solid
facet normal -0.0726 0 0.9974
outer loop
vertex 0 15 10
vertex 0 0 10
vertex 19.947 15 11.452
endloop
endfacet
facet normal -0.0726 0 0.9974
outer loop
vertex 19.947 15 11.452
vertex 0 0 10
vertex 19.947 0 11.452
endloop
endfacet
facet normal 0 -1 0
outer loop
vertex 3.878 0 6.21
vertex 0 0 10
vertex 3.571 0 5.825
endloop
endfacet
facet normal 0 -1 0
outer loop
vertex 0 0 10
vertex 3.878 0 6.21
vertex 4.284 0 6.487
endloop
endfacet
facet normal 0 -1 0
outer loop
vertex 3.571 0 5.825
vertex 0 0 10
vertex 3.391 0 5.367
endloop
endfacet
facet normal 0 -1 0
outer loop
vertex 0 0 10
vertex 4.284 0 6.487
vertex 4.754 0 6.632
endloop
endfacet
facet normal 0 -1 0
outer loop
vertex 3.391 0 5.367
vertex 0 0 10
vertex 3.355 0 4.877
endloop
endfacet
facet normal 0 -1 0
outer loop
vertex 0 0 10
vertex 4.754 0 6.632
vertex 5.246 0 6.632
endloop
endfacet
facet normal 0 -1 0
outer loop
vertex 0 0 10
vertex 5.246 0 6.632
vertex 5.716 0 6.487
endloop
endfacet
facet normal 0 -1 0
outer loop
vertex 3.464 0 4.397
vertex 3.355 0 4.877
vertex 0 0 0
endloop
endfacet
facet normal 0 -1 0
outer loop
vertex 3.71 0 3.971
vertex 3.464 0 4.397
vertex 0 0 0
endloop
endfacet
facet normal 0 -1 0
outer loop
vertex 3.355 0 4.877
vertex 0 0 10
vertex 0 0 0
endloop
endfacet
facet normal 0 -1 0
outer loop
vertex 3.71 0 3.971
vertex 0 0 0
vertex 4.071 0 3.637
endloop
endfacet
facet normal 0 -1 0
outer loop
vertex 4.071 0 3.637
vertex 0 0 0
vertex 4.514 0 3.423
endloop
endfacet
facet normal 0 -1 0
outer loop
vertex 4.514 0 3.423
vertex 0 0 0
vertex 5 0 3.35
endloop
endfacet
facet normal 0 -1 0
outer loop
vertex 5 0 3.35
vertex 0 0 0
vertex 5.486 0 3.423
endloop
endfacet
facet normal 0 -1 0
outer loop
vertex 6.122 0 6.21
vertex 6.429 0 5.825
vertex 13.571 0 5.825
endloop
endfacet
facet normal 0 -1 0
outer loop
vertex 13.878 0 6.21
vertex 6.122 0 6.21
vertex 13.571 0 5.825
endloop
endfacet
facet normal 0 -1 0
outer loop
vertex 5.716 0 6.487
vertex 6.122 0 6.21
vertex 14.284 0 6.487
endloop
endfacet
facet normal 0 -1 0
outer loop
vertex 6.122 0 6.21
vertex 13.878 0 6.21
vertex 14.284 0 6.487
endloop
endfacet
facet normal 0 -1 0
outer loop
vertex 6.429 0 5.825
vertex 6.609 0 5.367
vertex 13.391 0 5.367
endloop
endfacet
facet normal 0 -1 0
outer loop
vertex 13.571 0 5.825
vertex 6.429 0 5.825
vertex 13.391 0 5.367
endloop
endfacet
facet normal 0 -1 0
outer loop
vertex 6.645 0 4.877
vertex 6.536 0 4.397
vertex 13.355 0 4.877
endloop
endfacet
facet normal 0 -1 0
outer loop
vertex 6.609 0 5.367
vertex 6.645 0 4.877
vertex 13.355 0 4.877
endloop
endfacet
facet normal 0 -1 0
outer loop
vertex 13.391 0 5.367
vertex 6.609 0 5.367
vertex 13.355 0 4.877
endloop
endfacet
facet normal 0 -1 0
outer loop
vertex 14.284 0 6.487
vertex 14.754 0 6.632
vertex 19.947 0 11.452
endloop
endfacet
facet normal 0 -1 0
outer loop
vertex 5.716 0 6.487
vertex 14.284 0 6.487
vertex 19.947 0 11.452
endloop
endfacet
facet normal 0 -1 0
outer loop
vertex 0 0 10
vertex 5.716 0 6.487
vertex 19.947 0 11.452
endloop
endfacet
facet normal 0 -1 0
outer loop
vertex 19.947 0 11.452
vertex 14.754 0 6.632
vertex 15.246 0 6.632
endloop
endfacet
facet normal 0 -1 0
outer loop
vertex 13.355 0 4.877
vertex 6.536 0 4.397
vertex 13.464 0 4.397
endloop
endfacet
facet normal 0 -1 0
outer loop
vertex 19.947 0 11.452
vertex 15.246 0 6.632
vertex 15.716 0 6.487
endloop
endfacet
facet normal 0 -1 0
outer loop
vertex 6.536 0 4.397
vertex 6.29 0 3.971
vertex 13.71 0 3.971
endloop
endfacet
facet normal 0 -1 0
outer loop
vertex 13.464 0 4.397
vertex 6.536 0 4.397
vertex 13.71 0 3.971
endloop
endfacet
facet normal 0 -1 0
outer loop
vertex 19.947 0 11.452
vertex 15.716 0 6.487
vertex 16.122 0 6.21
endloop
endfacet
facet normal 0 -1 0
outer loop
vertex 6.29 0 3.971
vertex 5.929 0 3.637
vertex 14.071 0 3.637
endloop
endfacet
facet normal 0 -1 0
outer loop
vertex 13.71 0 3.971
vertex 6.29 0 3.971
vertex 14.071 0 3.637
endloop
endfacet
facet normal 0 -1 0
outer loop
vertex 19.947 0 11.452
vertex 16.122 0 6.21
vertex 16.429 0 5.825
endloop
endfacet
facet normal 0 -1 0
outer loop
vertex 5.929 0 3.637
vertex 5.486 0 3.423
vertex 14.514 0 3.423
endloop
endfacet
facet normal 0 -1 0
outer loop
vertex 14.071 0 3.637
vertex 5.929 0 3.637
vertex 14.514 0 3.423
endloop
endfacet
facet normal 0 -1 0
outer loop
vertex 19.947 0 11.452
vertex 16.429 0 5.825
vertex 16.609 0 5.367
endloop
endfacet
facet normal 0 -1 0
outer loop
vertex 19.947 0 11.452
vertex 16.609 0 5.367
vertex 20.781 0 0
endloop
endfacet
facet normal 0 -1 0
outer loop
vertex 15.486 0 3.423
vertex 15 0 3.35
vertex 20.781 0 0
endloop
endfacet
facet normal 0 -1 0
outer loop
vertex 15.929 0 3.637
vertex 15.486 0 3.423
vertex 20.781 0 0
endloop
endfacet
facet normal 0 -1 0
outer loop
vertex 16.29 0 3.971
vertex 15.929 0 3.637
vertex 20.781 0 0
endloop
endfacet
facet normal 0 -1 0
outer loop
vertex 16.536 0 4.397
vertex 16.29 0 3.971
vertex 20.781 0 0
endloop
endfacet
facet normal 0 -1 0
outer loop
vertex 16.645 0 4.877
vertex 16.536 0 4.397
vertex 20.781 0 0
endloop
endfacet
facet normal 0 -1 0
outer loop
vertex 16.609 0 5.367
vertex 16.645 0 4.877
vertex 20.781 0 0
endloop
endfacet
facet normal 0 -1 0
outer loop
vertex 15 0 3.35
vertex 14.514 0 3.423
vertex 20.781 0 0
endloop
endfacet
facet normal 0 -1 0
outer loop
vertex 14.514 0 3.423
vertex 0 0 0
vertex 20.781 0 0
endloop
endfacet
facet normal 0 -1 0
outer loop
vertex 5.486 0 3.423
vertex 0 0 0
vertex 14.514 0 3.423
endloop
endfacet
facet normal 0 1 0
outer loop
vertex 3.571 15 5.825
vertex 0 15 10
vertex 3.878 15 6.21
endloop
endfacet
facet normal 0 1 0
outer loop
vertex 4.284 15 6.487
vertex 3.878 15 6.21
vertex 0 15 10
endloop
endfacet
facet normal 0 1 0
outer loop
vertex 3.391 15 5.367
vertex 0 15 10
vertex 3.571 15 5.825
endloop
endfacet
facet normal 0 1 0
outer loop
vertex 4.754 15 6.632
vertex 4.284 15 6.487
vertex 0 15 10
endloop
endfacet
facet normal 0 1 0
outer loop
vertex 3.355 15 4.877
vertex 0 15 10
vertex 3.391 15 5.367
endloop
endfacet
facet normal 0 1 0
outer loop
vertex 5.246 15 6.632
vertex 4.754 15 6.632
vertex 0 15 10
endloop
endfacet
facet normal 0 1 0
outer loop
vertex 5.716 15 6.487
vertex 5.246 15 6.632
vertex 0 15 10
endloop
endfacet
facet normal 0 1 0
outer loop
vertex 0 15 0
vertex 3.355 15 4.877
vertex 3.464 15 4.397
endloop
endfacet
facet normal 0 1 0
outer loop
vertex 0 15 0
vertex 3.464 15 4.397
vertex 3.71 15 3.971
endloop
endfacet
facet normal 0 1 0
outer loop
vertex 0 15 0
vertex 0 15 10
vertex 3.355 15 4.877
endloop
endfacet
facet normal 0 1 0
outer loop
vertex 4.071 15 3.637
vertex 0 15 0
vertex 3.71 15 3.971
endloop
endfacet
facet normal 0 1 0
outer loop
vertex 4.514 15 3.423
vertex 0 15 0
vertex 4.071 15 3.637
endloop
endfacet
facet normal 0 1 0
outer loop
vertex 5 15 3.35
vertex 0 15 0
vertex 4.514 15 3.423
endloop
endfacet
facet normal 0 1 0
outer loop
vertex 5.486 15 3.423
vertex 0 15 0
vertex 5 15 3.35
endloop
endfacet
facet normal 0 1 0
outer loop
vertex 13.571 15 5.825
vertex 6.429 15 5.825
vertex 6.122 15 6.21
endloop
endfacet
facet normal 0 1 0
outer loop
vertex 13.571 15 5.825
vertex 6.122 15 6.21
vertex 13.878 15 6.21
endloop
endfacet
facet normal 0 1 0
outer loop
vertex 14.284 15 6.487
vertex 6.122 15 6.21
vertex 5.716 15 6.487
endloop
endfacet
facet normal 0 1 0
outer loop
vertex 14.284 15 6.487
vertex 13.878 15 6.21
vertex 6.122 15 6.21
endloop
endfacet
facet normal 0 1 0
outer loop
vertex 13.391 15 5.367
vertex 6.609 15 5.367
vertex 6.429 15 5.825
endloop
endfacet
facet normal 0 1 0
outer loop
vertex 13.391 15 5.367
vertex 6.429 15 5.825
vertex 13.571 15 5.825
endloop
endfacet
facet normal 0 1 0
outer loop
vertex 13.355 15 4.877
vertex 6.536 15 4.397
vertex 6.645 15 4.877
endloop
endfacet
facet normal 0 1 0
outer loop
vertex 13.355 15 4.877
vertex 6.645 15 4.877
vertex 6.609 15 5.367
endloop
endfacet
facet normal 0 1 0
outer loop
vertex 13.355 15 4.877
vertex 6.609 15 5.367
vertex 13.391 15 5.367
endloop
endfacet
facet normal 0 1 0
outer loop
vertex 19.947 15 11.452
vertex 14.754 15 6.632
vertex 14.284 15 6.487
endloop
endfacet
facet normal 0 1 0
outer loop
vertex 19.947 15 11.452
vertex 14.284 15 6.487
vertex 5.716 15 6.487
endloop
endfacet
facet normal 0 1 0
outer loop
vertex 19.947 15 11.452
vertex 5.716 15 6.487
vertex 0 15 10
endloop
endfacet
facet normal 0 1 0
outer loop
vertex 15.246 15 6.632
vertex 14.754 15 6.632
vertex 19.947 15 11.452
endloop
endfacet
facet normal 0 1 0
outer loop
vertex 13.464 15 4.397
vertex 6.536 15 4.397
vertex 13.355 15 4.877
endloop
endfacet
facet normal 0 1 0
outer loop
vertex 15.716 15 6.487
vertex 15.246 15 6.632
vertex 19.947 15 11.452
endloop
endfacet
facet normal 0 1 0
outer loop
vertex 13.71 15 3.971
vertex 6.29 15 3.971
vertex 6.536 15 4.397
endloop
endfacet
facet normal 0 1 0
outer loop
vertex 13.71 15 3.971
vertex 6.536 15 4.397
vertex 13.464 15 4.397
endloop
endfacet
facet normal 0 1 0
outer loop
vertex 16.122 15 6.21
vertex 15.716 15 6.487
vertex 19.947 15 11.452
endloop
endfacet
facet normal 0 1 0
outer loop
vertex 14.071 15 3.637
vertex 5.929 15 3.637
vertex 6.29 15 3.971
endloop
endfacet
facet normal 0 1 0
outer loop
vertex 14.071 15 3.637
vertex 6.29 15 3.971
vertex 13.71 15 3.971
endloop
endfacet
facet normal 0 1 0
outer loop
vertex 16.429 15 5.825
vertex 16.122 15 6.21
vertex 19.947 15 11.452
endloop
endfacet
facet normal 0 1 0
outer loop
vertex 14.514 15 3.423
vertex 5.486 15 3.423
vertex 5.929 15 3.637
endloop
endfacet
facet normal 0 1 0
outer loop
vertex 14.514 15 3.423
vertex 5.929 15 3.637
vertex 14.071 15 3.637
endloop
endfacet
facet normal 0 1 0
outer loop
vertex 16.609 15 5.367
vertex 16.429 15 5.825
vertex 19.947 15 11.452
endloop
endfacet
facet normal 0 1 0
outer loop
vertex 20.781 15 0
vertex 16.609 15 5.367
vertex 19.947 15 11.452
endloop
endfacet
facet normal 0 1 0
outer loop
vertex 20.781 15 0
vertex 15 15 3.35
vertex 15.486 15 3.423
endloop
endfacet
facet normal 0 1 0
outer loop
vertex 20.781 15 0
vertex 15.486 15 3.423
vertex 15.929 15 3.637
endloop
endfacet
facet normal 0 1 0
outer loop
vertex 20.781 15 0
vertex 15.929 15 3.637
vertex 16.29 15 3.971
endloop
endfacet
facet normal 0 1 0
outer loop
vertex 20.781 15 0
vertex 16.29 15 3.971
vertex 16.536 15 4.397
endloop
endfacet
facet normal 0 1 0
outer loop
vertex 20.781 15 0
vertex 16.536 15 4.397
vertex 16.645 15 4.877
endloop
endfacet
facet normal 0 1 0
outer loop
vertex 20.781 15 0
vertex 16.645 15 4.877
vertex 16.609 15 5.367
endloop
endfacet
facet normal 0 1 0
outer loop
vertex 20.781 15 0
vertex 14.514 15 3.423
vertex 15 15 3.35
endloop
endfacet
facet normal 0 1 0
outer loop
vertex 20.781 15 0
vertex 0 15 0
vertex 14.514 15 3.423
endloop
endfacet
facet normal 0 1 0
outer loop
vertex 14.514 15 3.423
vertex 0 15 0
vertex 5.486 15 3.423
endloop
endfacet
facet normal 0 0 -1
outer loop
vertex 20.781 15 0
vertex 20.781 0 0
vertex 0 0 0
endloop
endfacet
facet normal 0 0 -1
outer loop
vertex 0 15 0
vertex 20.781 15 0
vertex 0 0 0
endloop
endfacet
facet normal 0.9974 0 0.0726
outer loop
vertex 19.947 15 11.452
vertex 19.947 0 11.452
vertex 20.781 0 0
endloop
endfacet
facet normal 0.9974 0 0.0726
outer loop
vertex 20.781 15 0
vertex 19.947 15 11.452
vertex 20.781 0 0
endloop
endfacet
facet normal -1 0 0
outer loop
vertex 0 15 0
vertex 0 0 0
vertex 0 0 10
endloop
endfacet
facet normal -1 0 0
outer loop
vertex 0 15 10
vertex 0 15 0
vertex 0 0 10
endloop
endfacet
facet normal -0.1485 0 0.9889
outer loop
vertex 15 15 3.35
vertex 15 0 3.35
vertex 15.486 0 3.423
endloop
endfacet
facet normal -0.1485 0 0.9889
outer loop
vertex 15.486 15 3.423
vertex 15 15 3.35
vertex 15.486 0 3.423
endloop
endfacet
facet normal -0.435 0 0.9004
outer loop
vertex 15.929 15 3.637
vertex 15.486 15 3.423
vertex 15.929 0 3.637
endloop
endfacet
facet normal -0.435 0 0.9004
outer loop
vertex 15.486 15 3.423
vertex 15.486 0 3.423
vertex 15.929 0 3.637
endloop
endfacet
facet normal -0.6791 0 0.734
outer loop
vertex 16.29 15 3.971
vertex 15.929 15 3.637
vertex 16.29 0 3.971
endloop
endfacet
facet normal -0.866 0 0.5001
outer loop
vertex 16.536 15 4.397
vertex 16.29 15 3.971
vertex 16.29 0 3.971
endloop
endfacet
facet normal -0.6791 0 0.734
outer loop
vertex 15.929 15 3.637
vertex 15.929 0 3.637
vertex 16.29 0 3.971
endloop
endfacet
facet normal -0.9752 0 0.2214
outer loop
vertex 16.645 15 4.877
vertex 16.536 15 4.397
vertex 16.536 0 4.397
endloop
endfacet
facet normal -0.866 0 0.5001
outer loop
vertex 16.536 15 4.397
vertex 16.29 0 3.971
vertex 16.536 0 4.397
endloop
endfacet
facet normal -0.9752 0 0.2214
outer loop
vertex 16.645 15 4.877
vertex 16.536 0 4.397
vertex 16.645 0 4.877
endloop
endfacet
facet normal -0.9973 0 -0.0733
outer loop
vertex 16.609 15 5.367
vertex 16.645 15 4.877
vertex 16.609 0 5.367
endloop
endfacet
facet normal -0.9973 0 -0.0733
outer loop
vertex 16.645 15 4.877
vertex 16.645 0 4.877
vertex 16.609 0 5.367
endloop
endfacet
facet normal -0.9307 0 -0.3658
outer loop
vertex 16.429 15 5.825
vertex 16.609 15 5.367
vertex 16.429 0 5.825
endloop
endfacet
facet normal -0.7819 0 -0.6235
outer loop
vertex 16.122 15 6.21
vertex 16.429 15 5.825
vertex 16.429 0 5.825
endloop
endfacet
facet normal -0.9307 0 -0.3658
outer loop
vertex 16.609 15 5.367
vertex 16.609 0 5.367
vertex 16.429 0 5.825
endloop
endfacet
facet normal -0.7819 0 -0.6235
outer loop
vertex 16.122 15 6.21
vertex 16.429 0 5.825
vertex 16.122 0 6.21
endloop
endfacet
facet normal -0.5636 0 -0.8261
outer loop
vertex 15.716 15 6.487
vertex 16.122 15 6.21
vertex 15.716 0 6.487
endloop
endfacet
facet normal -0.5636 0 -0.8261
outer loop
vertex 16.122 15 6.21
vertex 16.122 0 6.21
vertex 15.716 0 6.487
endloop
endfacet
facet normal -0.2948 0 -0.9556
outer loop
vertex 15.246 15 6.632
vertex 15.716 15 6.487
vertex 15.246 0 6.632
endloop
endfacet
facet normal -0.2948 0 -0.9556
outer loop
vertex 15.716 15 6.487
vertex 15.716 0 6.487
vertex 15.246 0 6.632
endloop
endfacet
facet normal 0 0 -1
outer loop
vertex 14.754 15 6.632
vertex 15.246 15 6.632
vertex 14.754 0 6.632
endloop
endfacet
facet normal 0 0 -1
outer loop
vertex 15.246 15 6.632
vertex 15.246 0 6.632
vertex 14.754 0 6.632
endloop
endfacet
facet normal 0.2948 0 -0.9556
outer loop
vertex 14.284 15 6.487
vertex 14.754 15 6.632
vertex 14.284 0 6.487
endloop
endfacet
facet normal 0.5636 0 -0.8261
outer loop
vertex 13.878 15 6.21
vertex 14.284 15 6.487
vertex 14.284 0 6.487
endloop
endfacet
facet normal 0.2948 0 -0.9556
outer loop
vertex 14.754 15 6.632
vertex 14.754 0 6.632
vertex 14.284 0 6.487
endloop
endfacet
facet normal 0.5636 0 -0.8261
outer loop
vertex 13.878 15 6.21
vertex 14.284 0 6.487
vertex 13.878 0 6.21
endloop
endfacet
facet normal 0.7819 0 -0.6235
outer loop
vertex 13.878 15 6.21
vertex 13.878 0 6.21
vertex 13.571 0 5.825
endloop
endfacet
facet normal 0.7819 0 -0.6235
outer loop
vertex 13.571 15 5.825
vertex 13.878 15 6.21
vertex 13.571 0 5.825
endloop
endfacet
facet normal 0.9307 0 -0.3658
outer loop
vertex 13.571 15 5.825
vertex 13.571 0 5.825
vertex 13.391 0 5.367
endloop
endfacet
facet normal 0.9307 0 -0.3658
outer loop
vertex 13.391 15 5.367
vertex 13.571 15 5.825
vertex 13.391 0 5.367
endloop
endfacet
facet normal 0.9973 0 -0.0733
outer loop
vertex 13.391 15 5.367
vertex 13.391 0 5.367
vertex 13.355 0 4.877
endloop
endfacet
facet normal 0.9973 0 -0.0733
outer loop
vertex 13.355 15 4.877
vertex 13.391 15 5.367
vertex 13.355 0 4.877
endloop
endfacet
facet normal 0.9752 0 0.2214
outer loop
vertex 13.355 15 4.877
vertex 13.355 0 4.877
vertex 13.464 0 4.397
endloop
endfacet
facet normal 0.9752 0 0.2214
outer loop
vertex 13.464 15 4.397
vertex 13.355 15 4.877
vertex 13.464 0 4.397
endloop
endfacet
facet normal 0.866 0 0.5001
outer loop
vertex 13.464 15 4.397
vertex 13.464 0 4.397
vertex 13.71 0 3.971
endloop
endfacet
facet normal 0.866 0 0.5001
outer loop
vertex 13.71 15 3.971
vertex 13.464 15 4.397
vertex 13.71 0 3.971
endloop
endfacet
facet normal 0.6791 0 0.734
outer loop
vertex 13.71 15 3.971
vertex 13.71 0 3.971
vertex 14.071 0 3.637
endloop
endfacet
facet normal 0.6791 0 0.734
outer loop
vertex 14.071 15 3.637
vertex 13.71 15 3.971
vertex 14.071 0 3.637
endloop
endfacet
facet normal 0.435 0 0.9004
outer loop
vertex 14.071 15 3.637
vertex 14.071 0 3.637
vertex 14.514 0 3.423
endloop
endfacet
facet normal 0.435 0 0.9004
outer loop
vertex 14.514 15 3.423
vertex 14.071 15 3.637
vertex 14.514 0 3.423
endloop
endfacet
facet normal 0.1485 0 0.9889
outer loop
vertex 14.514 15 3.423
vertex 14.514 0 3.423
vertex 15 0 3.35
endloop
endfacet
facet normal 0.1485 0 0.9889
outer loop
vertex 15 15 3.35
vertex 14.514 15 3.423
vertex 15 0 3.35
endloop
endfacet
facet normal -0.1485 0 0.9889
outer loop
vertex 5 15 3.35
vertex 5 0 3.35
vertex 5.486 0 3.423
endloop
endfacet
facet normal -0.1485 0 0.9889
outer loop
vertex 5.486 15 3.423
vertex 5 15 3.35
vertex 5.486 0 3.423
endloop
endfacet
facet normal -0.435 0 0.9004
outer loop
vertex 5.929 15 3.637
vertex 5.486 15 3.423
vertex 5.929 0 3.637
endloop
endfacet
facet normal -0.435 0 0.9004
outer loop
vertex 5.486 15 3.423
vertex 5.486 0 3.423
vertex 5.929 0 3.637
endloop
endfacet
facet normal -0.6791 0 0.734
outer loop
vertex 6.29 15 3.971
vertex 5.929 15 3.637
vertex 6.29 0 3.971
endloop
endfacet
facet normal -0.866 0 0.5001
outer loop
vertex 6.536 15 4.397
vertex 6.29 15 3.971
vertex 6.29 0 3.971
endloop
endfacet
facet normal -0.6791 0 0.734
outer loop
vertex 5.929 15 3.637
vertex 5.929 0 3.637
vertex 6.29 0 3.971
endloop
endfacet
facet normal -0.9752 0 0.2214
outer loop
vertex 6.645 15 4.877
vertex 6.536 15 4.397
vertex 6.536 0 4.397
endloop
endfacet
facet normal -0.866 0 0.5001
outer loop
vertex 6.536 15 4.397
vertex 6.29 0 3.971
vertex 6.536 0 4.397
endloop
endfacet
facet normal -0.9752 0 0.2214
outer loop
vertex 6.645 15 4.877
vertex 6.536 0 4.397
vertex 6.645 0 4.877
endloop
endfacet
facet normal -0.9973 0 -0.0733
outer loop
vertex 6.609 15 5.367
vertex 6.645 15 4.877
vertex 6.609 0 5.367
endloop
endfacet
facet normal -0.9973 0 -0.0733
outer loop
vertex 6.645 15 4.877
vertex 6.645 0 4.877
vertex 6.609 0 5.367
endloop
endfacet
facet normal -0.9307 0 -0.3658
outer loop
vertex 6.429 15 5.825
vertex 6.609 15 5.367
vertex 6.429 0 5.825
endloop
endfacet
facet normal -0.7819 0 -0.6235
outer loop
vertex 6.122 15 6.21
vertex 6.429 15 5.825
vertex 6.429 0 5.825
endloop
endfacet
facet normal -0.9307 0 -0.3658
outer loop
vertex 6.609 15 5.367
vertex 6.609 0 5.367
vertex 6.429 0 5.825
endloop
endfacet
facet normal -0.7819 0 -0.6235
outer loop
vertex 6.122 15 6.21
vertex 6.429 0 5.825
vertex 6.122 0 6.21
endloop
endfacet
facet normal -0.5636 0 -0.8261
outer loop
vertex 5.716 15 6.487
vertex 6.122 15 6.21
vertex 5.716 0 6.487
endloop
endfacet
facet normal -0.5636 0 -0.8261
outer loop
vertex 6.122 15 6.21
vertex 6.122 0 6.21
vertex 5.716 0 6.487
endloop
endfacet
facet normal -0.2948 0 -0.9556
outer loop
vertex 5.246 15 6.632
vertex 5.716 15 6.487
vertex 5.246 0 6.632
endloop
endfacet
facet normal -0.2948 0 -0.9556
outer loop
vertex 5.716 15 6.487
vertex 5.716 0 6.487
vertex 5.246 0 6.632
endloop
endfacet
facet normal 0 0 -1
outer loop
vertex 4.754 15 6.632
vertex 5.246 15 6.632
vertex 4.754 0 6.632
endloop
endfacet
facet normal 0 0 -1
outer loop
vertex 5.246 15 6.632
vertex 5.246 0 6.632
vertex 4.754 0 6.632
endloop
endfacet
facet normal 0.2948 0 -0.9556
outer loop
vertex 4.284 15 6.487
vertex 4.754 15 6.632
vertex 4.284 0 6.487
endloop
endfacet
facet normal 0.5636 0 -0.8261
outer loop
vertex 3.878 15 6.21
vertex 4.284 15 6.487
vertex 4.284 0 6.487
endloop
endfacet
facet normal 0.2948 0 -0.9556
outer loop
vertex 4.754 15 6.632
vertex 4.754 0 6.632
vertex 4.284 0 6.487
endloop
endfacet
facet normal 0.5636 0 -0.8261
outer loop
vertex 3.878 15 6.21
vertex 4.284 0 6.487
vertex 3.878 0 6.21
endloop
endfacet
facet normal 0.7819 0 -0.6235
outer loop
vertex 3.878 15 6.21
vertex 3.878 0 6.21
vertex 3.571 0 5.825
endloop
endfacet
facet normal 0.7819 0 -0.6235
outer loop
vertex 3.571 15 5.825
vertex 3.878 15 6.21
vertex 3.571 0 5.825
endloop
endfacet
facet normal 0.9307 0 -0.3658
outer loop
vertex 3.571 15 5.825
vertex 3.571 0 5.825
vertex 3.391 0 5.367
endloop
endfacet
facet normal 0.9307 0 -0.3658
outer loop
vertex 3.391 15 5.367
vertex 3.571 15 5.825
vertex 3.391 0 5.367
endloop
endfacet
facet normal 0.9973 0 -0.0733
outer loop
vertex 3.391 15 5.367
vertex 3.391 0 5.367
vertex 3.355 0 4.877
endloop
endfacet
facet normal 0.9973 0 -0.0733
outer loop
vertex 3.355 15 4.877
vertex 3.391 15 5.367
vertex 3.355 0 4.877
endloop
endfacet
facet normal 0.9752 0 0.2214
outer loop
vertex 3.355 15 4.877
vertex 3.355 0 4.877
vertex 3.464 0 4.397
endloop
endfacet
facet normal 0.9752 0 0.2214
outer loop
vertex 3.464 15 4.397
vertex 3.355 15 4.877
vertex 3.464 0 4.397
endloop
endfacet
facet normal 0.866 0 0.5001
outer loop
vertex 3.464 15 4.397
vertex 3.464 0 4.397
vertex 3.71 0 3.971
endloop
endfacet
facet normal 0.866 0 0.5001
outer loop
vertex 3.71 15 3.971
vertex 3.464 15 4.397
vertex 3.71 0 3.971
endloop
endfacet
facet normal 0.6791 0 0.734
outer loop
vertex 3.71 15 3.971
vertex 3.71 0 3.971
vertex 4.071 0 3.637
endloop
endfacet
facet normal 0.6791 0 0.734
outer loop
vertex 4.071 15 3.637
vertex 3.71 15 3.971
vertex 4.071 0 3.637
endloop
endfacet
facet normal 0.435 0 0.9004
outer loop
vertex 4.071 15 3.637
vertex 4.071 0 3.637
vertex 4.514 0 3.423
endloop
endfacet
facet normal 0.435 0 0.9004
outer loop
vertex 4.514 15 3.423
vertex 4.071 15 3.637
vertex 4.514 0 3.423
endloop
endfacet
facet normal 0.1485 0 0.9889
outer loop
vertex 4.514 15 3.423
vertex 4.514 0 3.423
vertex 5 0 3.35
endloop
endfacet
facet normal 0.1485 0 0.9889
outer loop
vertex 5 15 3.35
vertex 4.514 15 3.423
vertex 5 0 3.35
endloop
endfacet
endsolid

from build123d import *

# Parameters (mm, degrees)
EXTRUDE_1_DEPTH     = 15
SKETCH_2_R          = 1.45
CUT_EXTRUDE_1_DEPTH = 29.071464012
SKETCH_3_R          = 1.65
CUT_EXTRUDE_2_DEPTH = 29.071464012


with BuildPart() as part:
    # 草图1 → 凸台-拉伸1 (new body)
    with BuildSketch(Plane(origin=(0, 0, 0), x_dir=(1, 0, 0), z_dir=(0, 1, 0))):
        Polygon((0, 0), (0, -10), (19.947198592, -11.452332033), (20.781029397, 0), align=None)
    extrude(amount=EXTRUDE_1_DEPTH)

    # 草图2 → 切除-拉伸1 (cut, through all)
    with BuildSketch(Plane.XZ):
        with Locations(Location((5, 5, 0), (0, 0, 270))):
            Circle(SKETCH_2_R)
        with Locations(Location((15, 5, 0), (0, 0, 270))):
            Circle(SKETCH_2_R)
    extrude(amount=-CUT_EXTRUDE_1_DEPTH, mode=Mode.SUBTRACT)

    # 草图3 → 切除-拉伸2 (cut, through all)
    with BuildSketch(Plane.XZ):
        with Locations(Location((5, 5, 0), (0, 0, 270))):
            Circle(SKETCH_3_R)
        with Locations(Location((15, 5, 0), (0, 0, 270))):
            Circle(SKETCH_3_R)
    extrude(amount=-CUT_EXTRUDE_2_DEPTH, mode=Mode.SUBTRACT)


solid = part.part
